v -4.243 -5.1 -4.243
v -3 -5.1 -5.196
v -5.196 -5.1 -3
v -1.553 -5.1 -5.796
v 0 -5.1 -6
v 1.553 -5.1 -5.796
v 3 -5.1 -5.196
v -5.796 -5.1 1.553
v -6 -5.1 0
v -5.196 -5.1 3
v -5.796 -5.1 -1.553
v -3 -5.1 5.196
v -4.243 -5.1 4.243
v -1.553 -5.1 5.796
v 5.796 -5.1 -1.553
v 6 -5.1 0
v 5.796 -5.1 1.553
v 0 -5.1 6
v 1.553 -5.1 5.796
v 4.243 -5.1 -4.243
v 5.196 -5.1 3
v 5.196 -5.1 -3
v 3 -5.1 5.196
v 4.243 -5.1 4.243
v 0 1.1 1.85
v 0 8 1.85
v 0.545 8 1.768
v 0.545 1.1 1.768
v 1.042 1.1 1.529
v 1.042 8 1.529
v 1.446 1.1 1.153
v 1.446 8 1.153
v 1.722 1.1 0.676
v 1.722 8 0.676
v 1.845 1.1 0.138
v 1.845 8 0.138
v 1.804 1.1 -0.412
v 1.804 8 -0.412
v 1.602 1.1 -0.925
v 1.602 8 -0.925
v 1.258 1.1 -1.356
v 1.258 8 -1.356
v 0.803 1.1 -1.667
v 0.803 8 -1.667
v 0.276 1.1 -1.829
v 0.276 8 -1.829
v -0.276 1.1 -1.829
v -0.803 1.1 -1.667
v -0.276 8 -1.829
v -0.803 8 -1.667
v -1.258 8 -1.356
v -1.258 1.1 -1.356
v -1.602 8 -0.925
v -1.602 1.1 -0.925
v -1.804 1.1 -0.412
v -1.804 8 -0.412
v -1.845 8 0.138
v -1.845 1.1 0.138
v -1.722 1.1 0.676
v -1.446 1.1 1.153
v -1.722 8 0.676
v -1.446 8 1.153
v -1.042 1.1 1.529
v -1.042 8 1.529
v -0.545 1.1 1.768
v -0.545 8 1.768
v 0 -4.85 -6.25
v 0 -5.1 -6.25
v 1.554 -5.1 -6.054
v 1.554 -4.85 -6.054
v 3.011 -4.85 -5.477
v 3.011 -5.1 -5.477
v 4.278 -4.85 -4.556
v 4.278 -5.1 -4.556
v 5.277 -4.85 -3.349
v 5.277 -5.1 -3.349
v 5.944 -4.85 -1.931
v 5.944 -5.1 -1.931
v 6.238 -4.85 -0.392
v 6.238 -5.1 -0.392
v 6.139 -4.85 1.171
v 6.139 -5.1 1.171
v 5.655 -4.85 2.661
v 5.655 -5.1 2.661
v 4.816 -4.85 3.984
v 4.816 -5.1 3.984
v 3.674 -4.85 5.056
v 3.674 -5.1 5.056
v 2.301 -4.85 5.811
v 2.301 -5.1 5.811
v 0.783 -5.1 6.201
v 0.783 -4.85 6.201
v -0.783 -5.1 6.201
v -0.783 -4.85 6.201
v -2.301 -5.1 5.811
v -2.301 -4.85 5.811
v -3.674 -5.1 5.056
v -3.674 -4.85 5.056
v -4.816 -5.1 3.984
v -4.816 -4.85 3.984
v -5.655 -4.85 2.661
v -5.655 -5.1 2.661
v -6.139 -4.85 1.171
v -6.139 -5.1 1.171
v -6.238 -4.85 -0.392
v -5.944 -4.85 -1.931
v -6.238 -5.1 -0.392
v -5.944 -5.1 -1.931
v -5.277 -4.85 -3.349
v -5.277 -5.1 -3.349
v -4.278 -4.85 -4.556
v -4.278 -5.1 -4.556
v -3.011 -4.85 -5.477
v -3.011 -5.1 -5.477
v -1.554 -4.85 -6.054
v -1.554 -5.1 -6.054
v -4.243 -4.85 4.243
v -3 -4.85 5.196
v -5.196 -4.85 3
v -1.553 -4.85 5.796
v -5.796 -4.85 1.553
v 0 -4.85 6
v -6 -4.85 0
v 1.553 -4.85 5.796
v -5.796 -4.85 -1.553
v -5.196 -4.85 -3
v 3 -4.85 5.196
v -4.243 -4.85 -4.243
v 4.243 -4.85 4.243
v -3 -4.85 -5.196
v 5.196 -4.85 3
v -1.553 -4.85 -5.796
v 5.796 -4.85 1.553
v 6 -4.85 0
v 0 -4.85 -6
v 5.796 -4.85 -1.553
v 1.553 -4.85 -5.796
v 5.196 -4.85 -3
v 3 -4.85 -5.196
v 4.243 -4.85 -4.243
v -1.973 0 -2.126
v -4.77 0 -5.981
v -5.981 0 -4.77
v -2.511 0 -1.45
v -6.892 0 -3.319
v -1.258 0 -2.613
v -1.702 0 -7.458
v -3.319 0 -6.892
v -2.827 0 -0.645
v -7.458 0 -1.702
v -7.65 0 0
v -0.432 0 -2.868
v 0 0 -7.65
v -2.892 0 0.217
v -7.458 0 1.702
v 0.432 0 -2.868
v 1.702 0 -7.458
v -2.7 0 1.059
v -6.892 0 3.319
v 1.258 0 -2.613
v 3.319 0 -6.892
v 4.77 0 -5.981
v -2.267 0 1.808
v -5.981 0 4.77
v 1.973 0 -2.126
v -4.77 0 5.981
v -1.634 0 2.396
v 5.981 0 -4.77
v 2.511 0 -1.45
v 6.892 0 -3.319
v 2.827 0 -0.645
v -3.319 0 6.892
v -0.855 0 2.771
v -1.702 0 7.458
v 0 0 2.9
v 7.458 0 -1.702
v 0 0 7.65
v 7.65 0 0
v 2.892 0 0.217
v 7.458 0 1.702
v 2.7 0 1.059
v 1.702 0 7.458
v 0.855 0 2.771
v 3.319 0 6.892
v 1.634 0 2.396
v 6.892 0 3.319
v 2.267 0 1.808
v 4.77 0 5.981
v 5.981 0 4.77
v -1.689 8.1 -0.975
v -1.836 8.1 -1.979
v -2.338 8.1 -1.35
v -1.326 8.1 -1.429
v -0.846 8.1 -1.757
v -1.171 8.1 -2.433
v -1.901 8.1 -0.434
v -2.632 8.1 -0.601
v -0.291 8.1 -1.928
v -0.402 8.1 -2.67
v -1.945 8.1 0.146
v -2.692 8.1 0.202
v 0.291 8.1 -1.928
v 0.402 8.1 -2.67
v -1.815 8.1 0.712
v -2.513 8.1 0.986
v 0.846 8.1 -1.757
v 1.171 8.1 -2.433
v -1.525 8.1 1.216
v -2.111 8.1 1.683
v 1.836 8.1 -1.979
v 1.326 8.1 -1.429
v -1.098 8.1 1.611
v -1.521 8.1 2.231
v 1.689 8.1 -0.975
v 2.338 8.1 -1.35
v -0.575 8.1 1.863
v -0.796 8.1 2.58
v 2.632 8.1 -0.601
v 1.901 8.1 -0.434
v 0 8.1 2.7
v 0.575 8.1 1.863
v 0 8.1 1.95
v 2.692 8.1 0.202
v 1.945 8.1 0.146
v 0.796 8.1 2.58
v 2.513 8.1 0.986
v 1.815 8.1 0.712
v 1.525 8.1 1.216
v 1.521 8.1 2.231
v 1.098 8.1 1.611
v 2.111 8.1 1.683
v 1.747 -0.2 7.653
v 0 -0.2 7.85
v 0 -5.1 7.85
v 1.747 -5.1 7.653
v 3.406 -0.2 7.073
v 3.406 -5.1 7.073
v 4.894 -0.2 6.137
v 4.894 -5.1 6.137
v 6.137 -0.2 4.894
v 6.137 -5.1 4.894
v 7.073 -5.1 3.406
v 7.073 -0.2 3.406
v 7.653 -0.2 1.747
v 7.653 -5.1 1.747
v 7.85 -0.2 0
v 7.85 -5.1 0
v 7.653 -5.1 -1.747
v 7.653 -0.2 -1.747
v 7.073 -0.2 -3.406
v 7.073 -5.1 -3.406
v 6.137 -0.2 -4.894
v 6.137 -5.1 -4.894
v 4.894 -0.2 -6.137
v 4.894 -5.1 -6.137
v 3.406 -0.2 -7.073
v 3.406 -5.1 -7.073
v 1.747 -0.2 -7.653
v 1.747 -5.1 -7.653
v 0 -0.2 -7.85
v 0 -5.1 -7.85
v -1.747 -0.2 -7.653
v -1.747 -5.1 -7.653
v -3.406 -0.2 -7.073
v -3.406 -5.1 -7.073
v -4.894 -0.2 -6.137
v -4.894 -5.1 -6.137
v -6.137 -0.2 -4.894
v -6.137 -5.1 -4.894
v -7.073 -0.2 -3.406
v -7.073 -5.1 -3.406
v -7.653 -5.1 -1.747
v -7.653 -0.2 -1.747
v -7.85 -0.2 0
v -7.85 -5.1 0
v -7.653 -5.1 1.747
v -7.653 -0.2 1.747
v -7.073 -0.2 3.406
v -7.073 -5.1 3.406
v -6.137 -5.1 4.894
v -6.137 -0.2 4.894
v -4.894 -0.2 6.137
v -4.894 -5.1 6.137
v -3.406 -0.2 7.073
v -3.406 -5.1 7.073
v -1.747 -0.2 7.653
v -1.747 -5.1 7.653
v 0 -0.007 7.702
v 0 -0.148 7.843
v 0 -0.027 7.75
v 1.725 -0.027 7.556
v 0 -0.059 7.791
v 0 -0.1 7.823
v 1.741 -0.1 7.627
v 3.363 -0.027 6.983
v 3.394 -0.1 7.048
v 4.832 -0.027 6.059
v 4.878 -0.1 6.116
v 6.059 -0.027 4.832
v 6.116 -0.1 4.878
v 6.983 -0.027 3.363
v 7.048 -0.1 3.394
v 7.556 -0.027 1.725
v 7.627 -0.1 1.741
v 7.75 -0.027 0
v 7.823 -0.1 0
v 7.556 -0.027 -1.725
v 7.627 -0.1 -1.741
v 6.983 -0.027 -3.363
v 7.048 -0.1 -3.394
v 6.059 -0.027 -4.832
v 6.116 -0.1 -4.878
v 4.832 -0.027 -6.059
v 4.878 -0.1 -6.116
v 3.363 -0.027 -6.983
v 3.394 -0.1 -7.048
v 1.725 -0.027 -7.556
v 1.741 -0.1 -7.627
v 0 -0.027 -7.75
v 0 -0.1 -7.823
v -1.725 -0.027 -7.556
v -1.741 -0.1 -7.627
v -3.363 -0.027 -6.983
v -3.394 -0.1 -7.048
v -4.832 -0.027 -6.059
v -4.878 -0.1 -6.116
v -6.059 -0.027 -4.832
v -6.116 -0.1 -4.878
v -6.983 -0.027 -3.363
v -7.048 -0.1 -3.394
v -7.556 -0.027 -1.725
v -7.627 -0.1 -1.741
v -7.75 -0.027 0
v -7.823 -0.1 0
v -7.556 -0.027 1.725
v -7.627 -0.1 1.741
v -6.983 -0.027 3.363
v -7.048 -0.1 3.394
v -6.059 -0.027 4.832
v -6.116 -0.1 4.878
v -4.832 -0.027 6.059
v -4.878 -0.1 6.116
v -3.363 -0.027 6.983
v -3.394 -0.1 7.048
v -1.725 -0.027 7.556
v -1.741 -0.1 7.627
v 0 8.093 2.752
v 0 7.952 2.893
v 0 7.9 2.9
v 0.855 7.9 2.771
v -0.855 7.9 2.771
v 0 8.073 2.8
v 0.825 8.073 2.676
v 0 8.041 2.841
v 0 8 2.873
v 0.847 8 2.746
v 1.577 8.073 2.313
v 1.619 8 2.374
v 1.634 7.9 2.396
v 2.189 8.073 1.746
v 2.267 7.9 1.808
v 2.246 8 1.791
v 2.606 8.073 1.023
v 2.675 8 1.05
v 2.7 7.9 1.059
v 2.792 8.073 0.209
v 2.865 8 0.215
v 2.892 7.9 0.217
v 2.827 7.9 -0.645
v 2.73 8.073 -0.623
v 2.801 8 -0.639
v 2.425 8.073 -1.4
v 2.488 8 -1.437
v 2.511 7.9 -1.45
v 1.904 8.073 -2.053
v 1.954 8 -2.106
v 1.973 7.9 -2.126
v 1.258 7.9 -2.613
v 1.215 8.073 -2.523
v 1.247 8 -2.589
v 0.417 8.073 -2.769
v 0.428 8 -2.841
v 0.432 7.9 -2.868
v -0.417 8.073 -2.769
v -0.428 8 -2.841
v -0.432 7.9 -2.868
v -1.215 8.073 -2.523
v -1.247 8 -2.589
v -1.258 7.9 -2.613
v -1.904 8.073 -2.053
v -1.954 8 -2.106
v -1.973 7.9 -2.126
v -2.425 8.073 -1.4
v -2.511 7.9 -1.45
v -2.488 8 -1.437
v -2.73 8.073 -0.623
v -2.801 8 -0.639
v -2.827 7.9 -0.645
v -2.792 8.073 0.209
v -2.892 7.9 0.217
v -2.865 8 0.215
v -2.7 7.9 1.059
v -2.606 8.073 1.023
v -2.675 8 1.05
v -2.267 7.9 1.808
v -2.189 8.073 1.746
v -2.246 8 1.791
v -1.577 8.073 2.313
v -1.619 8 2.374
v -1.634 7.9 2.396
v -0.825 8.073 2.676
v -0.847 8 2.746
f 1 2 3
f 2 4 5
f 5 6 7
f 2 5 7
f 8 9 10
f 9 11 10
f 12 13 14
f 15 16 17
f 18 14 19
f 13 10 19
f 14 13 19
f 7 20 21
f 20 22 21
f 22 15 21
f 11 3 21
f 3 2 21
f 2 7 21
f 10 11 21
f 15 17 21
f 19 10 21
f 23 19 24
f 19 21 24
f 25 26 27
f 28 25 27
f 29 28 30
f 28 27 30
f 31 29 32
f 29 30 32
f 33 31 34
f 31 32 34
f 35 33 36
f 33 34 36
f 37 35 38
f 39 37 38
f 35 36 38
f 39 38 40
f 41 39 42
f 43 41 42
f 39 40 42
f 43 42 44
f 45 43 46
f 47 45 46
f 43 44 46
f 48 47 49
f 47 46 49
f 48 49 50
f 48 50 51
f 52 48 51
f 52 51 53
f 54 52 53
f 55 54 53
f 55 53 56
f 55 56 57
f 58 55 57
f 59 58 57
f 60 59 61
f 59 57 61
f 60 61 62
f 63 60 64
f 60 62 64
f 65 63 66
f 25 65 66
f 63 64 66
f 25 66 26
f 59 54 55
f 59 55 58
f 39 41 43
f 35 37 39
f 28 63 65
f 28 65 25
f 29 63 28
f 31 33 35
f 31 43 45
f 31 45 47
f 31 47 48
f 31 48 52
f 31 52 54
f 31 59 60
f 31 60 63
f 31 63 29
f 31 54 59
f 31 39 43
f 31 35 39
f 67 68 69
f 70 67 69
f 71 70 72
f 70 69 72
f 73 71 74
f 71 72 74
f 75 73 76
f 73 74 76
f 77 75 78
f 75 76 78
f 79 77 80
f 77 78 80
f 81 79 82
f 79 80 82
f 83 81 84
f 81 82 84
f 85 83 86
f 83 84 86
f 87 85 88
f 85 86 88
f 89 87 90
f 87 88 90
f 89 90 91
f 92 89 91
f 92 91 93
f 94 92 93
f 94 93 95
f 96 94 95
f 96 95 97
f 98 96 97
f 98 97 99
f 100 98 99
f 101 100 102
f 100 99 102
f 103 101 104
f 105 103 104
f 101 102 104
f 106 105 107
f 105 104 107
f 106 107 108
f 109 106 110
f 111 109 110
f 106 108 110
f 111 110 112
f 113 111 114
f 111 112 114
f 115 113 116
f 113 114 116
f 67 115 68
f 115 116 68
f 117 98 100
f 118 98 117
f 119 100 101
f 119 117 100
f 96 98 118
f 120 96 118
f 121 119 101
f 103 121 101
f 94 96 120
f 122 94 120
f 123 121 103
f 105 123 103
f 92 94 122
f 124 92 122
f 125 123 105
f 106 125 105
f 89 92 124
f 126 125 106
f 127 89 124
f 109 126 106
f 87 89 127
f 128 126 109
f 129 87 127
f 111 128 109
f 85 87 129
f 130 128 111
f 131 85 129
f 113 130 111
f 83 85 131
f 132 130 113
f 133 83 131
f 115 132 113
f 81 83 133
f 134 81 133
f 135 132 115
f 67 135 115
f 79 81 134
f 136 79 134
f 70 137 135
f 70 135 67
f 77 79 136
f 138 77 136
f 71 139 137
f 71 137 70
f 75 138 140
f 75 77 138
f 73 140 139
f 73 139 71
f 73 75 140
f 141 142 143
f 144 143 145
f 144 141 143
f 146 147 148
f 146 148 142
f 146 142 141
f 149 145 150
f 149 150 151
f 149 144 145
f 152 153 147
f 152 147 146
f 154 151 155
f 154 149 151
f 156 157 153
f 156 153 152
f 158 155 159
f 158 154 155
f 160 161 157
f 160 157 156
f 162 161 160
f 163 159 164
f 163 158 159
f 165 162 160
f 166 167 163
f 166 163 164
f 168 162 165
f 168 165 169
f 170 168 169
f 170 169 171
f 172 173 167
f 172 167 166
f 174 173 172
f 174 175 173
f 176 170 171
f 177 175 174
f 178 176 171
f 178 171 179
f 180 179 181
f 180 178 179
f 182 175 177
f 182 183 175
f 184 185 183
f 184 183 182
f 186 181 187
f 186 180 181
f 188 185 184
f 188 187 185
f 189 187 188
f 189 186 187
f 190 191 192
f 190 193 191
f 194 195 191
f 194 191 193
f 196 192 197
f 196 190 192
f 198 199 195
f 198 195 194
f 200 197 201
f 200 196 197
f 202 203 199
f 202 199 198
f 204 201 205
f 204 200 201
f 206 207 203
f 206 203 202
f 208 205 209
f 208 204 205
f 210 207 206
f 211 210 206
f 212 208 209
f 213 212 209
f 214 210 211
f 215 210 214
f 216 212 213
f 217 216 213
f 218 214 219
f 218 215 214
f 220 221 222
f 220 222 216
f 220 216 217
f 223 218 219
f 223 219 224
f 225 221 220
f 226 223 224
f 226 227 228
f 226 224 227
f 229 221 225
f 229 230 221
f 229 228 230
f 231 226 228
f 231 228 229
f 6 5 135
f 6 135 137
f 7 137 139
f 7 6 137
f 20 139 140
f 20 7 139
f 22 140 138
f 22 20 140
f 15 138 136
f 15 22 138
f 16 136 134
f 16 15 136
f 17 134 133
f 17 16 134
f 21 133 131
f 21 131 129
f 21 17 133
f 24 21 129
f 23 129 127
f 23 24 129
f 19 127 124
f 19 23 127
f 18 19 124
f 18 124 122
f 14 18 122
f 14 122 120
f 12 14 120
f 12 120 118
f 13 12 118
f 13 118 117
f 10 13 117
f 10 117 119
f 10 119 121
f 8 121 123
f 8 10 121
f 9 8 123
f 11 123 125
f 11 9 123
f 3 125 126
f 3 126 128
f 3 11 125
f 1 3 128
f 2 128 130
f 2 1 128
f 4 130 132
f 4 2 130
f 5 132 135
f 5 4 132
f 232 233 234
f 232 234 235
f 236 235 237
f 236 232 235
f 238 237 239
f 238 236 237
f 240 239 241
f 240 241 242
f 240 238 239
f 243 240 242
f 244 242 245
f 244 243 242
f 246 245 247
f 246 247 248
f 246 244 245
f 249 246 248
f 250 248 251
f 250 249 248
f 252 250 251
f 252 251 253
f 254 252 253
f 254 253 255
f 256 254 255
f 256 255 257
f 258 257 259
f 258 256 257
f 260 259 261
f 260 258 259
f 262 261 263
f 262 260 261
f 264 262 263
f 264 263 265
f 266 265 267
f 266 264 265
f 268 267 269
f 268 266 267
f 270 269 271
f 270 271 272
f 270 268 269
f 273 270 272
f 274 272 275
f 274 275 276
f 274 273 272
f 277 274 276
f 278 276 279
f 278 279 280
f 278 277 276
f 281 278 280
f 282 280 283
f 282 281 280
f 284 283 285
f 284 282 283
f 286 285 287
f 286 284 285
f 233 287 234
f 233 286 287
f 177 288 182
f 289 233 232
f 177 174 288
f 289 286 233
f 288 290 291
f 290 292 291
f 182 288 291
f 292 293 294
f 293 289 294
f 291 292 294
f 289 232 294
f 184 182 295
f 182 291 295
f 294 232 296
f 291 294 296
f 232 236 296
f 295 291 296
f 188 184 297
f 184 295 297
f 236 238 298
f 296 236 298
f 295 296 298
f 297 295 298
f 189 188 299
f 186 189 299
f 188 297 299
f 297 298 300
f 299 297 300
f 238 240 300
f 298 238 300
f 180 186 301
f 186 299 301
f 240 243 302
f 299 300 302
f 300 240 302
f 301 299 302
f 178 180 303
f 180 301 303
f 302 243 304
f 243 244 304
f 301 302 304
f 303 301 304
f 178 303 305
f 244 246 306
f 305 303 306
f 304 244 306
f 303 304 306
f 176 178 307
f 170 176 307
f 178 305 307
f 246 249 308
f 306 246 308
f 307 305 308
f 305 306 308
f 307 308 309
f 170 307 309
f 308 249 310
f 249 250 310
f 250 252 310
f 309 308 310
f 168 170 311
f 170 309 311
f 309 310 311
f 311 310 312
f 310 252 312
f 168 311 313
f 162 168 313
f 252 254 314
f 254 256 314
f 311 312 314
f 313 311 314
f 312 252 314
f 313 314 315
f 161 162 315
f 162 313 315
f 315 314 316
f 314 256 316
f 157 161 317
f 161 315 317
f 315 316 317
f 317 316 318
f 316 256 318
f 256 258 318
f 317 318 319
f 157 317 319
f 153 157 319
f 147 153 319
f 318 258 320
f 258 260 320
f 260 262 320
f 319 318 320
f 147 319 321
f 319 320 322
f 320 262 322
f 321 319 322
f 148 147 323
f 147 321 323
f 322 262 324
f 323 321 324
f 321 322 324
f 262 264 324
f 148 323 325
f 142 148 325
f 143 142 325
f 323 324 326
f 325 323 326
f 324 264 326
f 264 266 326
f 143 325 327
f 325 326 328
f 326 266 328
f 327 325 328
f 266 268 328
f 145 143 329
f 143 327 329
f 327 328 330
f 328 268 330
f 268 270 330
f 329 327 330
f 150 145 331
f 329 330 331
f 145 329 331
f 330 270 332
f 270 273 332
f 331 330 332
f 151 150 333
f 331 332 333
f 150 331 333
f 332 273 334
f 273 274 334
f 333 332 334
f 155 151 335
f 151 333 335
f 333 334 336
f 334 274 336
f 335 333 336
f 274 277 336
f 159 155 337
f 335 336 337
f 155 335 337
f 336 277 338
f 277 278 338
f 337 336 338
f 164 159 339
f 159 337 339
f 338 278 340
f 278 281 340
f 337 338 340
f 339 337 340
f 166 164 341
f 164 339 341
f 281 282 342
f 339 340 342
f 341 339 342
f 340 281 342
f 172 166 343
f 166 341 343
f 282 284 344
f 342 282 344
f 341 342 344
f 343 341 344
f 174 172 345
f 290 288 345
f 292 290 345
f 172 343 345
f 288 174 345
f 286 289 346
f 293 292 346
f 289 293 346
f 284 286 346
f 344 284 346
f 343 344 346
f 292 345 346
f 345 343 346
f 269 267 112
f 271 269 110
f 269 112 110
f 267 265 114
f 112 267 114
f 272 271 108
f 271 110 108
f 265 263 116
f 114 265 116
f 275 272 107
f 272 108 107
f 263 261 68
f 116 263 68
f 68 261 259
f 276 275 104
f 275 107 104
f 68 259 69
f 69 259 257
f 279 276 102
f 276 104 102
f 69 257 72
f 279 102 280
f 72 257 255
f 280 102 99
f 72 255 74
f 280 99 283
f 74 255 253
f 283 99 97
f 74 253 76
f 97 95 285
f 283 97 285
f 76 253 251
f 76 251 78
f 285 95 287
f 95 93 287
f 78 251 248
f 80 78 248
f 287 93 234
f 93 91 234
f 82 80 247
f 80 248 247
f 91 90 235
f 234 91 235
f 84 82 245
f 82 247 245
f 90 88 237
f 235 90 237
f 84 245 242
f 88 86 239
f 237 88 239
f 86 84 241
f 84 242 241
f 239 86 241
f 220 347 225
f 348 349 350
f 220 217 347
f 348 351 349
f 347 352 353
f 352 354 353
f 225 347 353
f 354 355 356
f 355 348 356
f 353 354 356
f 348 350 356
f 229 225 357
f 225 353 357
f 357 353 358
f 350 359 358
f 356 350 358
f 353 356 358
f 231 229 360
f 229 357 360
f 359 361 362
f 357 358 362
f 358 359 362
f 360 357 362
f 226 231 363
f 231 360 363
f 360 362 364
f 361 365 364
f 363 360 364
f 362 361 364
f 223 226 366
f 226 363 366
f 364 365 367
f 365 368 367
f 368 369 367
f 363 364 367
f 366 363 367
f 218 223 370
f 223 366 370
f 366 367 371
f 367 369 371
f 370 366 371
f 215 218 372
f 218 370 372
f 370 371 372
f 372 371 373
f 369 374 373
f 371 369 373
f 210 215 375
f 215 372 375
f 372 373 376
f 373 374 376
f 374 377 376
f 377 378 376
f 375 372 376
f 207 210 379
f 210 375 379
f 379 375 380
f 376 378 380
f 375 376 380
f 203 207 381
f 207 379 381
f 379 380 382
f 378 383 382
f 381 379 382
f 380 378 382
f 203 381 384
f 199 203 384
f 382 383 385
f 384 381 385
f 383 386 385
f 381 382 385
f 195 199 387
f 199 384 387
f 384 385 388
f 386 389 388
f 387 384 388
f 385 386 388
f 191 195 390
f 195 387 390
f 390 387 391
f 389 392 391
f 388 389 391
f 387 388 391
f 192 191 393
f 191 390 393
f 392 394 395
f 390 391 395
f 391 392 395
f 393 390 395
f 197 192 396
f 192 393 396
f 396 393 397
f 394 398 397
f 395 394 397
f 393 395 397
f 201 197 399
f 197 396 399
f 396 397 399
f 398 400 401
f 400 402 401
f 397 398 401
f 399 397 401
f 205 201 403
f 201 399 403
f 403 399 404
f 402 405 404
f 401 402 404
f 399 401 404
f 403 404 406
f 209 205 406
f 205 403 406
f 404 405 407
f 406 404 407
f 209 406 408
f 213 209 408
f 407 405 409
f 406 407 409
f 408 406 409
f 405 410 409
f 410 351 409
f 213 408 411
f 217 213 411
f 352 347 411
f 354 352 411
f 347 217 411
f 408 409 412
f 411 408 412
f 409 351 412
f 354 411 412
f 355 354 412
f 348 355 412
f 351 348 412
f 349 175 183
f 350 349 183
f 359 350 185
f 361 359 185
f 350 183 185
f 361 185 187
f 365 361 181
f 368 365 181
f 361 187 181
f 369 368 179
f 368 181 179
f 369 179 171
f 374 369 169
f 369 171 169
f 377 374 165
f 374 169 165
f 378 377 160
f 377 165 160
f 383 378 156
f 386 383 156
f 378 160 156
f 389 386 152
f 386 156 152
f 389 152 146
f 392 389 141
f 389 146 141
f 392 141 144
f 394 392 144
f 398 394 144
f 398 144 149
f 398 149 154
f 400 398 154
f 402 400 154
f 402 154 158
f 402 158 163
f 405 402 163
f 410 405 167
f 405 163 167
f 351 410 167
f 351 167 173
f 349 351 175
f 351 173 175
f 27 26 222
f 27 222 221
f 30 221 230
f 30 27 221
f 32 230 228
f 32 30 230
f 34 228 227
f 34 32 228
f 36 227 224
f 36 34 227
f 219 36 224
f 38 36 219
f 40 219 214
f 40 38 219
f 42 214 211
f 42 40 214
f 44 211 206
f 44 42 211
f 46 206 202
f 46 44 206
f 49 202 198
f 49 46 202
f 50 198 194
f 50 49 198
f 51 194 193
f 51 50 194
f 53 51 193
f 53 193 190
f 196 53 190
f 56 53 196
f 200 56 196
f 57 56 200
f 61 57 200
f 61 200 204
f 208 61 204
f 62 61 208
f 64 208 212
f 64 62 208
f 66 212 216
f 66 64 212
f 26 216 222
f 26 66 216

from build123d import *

# Parameters (mm, degrees)
SKETCH1_R           = 7.85
BOSS_EXTRUDE1_DEPTH = 5.1
SKETCH2_R           = 2.9
BOSS_EXTRUDE2_DEPTH = 8.1
SKETCH3_R           = 1.85
CUT_EXTRUDE1_DEPTH  = 7
CHAMFER1_SIZE       = 0.1
FILLET2_R           = 0.2
SKETCH4_R           = 6.25
SKETCH4_R_2         = 6
CUT_EXTRUDE2_DEPTH  = 0.25


with BuildPart() as part:
    # Sketch1 → Boss-Extrude1 (new body)
    with BuildSketch(Plane(origin=(0, 0, 0), x_dir=(1, 0, 0), z_dir=(0, 1, 0))):
        with Locations(Location((0, 0, 0), (0, 0, 270))):
            Circle(SKETCH1_R)
    extrude(amount=-BOSS_EXTRUDE1_DEPTH)

    # Sketch2 → Boss-Extrude2 (add)
    with BuildSketch(Plane(origin=(0, 0, 0), x_dir=(1, 0, 0), z_dir=(0, 1, 0))):
        with Locations(Location((0, 0, 0), (0, 0, 270))):
            Circle(SKETCH2_R)
    extrude(amount=BOSS_EXTRUDE2_DEPTH)

    # Sketch3 → Cut-Extrude1 (cut)
    with BuildSketch(Plane(origin=(0, 8.1, 0), x_dir=(1, 0, 0), z_dir=(0, 1, 0))):
        with Locations(Location((0, 0, 0), (0, 0, 270))):
            Circle(SKETCH3_R)
    extrude(amount=-CUT_EXTRUDE1_DEPTH, mode=Mode.SUBTRACT)

    # Chamfer1
    chamfer1_edges = [part.edges().sort_by_distance(p)[0] for p in [
        (0, 8.1, -1.85),
    ]]
    chamfer(chamfer1_edges, length=CHAMFER1_SIZE)

    # Fillet2
    fillet2_edges = [part.edges().sort_by_distance(p)[0] for p in [
        (0, 0, -7.85),
        (0, 8.1, -2.9),
    ]]
    fillet(fillet2_edges, radius=FILLET2_R)

    # Sketch4 → Cut-Extrude2 (cut)
    with BuildSketch(Plane.XZ.offset(5.1)):
        with Locations(Location((0, 0, 0), (0, 0, 270))):
            Circle(SKETCH4_R)
        with Locations(Location((0, 0, 0), (0, 0, 270))):
            Circle(SKETCH4_R_2, mode=Mode.SUBTRACT)
    extrude(amount=-CUT_EXTRUDE2_DEPTH, mode=Mode.SUBTRACT)


solid = part.part
